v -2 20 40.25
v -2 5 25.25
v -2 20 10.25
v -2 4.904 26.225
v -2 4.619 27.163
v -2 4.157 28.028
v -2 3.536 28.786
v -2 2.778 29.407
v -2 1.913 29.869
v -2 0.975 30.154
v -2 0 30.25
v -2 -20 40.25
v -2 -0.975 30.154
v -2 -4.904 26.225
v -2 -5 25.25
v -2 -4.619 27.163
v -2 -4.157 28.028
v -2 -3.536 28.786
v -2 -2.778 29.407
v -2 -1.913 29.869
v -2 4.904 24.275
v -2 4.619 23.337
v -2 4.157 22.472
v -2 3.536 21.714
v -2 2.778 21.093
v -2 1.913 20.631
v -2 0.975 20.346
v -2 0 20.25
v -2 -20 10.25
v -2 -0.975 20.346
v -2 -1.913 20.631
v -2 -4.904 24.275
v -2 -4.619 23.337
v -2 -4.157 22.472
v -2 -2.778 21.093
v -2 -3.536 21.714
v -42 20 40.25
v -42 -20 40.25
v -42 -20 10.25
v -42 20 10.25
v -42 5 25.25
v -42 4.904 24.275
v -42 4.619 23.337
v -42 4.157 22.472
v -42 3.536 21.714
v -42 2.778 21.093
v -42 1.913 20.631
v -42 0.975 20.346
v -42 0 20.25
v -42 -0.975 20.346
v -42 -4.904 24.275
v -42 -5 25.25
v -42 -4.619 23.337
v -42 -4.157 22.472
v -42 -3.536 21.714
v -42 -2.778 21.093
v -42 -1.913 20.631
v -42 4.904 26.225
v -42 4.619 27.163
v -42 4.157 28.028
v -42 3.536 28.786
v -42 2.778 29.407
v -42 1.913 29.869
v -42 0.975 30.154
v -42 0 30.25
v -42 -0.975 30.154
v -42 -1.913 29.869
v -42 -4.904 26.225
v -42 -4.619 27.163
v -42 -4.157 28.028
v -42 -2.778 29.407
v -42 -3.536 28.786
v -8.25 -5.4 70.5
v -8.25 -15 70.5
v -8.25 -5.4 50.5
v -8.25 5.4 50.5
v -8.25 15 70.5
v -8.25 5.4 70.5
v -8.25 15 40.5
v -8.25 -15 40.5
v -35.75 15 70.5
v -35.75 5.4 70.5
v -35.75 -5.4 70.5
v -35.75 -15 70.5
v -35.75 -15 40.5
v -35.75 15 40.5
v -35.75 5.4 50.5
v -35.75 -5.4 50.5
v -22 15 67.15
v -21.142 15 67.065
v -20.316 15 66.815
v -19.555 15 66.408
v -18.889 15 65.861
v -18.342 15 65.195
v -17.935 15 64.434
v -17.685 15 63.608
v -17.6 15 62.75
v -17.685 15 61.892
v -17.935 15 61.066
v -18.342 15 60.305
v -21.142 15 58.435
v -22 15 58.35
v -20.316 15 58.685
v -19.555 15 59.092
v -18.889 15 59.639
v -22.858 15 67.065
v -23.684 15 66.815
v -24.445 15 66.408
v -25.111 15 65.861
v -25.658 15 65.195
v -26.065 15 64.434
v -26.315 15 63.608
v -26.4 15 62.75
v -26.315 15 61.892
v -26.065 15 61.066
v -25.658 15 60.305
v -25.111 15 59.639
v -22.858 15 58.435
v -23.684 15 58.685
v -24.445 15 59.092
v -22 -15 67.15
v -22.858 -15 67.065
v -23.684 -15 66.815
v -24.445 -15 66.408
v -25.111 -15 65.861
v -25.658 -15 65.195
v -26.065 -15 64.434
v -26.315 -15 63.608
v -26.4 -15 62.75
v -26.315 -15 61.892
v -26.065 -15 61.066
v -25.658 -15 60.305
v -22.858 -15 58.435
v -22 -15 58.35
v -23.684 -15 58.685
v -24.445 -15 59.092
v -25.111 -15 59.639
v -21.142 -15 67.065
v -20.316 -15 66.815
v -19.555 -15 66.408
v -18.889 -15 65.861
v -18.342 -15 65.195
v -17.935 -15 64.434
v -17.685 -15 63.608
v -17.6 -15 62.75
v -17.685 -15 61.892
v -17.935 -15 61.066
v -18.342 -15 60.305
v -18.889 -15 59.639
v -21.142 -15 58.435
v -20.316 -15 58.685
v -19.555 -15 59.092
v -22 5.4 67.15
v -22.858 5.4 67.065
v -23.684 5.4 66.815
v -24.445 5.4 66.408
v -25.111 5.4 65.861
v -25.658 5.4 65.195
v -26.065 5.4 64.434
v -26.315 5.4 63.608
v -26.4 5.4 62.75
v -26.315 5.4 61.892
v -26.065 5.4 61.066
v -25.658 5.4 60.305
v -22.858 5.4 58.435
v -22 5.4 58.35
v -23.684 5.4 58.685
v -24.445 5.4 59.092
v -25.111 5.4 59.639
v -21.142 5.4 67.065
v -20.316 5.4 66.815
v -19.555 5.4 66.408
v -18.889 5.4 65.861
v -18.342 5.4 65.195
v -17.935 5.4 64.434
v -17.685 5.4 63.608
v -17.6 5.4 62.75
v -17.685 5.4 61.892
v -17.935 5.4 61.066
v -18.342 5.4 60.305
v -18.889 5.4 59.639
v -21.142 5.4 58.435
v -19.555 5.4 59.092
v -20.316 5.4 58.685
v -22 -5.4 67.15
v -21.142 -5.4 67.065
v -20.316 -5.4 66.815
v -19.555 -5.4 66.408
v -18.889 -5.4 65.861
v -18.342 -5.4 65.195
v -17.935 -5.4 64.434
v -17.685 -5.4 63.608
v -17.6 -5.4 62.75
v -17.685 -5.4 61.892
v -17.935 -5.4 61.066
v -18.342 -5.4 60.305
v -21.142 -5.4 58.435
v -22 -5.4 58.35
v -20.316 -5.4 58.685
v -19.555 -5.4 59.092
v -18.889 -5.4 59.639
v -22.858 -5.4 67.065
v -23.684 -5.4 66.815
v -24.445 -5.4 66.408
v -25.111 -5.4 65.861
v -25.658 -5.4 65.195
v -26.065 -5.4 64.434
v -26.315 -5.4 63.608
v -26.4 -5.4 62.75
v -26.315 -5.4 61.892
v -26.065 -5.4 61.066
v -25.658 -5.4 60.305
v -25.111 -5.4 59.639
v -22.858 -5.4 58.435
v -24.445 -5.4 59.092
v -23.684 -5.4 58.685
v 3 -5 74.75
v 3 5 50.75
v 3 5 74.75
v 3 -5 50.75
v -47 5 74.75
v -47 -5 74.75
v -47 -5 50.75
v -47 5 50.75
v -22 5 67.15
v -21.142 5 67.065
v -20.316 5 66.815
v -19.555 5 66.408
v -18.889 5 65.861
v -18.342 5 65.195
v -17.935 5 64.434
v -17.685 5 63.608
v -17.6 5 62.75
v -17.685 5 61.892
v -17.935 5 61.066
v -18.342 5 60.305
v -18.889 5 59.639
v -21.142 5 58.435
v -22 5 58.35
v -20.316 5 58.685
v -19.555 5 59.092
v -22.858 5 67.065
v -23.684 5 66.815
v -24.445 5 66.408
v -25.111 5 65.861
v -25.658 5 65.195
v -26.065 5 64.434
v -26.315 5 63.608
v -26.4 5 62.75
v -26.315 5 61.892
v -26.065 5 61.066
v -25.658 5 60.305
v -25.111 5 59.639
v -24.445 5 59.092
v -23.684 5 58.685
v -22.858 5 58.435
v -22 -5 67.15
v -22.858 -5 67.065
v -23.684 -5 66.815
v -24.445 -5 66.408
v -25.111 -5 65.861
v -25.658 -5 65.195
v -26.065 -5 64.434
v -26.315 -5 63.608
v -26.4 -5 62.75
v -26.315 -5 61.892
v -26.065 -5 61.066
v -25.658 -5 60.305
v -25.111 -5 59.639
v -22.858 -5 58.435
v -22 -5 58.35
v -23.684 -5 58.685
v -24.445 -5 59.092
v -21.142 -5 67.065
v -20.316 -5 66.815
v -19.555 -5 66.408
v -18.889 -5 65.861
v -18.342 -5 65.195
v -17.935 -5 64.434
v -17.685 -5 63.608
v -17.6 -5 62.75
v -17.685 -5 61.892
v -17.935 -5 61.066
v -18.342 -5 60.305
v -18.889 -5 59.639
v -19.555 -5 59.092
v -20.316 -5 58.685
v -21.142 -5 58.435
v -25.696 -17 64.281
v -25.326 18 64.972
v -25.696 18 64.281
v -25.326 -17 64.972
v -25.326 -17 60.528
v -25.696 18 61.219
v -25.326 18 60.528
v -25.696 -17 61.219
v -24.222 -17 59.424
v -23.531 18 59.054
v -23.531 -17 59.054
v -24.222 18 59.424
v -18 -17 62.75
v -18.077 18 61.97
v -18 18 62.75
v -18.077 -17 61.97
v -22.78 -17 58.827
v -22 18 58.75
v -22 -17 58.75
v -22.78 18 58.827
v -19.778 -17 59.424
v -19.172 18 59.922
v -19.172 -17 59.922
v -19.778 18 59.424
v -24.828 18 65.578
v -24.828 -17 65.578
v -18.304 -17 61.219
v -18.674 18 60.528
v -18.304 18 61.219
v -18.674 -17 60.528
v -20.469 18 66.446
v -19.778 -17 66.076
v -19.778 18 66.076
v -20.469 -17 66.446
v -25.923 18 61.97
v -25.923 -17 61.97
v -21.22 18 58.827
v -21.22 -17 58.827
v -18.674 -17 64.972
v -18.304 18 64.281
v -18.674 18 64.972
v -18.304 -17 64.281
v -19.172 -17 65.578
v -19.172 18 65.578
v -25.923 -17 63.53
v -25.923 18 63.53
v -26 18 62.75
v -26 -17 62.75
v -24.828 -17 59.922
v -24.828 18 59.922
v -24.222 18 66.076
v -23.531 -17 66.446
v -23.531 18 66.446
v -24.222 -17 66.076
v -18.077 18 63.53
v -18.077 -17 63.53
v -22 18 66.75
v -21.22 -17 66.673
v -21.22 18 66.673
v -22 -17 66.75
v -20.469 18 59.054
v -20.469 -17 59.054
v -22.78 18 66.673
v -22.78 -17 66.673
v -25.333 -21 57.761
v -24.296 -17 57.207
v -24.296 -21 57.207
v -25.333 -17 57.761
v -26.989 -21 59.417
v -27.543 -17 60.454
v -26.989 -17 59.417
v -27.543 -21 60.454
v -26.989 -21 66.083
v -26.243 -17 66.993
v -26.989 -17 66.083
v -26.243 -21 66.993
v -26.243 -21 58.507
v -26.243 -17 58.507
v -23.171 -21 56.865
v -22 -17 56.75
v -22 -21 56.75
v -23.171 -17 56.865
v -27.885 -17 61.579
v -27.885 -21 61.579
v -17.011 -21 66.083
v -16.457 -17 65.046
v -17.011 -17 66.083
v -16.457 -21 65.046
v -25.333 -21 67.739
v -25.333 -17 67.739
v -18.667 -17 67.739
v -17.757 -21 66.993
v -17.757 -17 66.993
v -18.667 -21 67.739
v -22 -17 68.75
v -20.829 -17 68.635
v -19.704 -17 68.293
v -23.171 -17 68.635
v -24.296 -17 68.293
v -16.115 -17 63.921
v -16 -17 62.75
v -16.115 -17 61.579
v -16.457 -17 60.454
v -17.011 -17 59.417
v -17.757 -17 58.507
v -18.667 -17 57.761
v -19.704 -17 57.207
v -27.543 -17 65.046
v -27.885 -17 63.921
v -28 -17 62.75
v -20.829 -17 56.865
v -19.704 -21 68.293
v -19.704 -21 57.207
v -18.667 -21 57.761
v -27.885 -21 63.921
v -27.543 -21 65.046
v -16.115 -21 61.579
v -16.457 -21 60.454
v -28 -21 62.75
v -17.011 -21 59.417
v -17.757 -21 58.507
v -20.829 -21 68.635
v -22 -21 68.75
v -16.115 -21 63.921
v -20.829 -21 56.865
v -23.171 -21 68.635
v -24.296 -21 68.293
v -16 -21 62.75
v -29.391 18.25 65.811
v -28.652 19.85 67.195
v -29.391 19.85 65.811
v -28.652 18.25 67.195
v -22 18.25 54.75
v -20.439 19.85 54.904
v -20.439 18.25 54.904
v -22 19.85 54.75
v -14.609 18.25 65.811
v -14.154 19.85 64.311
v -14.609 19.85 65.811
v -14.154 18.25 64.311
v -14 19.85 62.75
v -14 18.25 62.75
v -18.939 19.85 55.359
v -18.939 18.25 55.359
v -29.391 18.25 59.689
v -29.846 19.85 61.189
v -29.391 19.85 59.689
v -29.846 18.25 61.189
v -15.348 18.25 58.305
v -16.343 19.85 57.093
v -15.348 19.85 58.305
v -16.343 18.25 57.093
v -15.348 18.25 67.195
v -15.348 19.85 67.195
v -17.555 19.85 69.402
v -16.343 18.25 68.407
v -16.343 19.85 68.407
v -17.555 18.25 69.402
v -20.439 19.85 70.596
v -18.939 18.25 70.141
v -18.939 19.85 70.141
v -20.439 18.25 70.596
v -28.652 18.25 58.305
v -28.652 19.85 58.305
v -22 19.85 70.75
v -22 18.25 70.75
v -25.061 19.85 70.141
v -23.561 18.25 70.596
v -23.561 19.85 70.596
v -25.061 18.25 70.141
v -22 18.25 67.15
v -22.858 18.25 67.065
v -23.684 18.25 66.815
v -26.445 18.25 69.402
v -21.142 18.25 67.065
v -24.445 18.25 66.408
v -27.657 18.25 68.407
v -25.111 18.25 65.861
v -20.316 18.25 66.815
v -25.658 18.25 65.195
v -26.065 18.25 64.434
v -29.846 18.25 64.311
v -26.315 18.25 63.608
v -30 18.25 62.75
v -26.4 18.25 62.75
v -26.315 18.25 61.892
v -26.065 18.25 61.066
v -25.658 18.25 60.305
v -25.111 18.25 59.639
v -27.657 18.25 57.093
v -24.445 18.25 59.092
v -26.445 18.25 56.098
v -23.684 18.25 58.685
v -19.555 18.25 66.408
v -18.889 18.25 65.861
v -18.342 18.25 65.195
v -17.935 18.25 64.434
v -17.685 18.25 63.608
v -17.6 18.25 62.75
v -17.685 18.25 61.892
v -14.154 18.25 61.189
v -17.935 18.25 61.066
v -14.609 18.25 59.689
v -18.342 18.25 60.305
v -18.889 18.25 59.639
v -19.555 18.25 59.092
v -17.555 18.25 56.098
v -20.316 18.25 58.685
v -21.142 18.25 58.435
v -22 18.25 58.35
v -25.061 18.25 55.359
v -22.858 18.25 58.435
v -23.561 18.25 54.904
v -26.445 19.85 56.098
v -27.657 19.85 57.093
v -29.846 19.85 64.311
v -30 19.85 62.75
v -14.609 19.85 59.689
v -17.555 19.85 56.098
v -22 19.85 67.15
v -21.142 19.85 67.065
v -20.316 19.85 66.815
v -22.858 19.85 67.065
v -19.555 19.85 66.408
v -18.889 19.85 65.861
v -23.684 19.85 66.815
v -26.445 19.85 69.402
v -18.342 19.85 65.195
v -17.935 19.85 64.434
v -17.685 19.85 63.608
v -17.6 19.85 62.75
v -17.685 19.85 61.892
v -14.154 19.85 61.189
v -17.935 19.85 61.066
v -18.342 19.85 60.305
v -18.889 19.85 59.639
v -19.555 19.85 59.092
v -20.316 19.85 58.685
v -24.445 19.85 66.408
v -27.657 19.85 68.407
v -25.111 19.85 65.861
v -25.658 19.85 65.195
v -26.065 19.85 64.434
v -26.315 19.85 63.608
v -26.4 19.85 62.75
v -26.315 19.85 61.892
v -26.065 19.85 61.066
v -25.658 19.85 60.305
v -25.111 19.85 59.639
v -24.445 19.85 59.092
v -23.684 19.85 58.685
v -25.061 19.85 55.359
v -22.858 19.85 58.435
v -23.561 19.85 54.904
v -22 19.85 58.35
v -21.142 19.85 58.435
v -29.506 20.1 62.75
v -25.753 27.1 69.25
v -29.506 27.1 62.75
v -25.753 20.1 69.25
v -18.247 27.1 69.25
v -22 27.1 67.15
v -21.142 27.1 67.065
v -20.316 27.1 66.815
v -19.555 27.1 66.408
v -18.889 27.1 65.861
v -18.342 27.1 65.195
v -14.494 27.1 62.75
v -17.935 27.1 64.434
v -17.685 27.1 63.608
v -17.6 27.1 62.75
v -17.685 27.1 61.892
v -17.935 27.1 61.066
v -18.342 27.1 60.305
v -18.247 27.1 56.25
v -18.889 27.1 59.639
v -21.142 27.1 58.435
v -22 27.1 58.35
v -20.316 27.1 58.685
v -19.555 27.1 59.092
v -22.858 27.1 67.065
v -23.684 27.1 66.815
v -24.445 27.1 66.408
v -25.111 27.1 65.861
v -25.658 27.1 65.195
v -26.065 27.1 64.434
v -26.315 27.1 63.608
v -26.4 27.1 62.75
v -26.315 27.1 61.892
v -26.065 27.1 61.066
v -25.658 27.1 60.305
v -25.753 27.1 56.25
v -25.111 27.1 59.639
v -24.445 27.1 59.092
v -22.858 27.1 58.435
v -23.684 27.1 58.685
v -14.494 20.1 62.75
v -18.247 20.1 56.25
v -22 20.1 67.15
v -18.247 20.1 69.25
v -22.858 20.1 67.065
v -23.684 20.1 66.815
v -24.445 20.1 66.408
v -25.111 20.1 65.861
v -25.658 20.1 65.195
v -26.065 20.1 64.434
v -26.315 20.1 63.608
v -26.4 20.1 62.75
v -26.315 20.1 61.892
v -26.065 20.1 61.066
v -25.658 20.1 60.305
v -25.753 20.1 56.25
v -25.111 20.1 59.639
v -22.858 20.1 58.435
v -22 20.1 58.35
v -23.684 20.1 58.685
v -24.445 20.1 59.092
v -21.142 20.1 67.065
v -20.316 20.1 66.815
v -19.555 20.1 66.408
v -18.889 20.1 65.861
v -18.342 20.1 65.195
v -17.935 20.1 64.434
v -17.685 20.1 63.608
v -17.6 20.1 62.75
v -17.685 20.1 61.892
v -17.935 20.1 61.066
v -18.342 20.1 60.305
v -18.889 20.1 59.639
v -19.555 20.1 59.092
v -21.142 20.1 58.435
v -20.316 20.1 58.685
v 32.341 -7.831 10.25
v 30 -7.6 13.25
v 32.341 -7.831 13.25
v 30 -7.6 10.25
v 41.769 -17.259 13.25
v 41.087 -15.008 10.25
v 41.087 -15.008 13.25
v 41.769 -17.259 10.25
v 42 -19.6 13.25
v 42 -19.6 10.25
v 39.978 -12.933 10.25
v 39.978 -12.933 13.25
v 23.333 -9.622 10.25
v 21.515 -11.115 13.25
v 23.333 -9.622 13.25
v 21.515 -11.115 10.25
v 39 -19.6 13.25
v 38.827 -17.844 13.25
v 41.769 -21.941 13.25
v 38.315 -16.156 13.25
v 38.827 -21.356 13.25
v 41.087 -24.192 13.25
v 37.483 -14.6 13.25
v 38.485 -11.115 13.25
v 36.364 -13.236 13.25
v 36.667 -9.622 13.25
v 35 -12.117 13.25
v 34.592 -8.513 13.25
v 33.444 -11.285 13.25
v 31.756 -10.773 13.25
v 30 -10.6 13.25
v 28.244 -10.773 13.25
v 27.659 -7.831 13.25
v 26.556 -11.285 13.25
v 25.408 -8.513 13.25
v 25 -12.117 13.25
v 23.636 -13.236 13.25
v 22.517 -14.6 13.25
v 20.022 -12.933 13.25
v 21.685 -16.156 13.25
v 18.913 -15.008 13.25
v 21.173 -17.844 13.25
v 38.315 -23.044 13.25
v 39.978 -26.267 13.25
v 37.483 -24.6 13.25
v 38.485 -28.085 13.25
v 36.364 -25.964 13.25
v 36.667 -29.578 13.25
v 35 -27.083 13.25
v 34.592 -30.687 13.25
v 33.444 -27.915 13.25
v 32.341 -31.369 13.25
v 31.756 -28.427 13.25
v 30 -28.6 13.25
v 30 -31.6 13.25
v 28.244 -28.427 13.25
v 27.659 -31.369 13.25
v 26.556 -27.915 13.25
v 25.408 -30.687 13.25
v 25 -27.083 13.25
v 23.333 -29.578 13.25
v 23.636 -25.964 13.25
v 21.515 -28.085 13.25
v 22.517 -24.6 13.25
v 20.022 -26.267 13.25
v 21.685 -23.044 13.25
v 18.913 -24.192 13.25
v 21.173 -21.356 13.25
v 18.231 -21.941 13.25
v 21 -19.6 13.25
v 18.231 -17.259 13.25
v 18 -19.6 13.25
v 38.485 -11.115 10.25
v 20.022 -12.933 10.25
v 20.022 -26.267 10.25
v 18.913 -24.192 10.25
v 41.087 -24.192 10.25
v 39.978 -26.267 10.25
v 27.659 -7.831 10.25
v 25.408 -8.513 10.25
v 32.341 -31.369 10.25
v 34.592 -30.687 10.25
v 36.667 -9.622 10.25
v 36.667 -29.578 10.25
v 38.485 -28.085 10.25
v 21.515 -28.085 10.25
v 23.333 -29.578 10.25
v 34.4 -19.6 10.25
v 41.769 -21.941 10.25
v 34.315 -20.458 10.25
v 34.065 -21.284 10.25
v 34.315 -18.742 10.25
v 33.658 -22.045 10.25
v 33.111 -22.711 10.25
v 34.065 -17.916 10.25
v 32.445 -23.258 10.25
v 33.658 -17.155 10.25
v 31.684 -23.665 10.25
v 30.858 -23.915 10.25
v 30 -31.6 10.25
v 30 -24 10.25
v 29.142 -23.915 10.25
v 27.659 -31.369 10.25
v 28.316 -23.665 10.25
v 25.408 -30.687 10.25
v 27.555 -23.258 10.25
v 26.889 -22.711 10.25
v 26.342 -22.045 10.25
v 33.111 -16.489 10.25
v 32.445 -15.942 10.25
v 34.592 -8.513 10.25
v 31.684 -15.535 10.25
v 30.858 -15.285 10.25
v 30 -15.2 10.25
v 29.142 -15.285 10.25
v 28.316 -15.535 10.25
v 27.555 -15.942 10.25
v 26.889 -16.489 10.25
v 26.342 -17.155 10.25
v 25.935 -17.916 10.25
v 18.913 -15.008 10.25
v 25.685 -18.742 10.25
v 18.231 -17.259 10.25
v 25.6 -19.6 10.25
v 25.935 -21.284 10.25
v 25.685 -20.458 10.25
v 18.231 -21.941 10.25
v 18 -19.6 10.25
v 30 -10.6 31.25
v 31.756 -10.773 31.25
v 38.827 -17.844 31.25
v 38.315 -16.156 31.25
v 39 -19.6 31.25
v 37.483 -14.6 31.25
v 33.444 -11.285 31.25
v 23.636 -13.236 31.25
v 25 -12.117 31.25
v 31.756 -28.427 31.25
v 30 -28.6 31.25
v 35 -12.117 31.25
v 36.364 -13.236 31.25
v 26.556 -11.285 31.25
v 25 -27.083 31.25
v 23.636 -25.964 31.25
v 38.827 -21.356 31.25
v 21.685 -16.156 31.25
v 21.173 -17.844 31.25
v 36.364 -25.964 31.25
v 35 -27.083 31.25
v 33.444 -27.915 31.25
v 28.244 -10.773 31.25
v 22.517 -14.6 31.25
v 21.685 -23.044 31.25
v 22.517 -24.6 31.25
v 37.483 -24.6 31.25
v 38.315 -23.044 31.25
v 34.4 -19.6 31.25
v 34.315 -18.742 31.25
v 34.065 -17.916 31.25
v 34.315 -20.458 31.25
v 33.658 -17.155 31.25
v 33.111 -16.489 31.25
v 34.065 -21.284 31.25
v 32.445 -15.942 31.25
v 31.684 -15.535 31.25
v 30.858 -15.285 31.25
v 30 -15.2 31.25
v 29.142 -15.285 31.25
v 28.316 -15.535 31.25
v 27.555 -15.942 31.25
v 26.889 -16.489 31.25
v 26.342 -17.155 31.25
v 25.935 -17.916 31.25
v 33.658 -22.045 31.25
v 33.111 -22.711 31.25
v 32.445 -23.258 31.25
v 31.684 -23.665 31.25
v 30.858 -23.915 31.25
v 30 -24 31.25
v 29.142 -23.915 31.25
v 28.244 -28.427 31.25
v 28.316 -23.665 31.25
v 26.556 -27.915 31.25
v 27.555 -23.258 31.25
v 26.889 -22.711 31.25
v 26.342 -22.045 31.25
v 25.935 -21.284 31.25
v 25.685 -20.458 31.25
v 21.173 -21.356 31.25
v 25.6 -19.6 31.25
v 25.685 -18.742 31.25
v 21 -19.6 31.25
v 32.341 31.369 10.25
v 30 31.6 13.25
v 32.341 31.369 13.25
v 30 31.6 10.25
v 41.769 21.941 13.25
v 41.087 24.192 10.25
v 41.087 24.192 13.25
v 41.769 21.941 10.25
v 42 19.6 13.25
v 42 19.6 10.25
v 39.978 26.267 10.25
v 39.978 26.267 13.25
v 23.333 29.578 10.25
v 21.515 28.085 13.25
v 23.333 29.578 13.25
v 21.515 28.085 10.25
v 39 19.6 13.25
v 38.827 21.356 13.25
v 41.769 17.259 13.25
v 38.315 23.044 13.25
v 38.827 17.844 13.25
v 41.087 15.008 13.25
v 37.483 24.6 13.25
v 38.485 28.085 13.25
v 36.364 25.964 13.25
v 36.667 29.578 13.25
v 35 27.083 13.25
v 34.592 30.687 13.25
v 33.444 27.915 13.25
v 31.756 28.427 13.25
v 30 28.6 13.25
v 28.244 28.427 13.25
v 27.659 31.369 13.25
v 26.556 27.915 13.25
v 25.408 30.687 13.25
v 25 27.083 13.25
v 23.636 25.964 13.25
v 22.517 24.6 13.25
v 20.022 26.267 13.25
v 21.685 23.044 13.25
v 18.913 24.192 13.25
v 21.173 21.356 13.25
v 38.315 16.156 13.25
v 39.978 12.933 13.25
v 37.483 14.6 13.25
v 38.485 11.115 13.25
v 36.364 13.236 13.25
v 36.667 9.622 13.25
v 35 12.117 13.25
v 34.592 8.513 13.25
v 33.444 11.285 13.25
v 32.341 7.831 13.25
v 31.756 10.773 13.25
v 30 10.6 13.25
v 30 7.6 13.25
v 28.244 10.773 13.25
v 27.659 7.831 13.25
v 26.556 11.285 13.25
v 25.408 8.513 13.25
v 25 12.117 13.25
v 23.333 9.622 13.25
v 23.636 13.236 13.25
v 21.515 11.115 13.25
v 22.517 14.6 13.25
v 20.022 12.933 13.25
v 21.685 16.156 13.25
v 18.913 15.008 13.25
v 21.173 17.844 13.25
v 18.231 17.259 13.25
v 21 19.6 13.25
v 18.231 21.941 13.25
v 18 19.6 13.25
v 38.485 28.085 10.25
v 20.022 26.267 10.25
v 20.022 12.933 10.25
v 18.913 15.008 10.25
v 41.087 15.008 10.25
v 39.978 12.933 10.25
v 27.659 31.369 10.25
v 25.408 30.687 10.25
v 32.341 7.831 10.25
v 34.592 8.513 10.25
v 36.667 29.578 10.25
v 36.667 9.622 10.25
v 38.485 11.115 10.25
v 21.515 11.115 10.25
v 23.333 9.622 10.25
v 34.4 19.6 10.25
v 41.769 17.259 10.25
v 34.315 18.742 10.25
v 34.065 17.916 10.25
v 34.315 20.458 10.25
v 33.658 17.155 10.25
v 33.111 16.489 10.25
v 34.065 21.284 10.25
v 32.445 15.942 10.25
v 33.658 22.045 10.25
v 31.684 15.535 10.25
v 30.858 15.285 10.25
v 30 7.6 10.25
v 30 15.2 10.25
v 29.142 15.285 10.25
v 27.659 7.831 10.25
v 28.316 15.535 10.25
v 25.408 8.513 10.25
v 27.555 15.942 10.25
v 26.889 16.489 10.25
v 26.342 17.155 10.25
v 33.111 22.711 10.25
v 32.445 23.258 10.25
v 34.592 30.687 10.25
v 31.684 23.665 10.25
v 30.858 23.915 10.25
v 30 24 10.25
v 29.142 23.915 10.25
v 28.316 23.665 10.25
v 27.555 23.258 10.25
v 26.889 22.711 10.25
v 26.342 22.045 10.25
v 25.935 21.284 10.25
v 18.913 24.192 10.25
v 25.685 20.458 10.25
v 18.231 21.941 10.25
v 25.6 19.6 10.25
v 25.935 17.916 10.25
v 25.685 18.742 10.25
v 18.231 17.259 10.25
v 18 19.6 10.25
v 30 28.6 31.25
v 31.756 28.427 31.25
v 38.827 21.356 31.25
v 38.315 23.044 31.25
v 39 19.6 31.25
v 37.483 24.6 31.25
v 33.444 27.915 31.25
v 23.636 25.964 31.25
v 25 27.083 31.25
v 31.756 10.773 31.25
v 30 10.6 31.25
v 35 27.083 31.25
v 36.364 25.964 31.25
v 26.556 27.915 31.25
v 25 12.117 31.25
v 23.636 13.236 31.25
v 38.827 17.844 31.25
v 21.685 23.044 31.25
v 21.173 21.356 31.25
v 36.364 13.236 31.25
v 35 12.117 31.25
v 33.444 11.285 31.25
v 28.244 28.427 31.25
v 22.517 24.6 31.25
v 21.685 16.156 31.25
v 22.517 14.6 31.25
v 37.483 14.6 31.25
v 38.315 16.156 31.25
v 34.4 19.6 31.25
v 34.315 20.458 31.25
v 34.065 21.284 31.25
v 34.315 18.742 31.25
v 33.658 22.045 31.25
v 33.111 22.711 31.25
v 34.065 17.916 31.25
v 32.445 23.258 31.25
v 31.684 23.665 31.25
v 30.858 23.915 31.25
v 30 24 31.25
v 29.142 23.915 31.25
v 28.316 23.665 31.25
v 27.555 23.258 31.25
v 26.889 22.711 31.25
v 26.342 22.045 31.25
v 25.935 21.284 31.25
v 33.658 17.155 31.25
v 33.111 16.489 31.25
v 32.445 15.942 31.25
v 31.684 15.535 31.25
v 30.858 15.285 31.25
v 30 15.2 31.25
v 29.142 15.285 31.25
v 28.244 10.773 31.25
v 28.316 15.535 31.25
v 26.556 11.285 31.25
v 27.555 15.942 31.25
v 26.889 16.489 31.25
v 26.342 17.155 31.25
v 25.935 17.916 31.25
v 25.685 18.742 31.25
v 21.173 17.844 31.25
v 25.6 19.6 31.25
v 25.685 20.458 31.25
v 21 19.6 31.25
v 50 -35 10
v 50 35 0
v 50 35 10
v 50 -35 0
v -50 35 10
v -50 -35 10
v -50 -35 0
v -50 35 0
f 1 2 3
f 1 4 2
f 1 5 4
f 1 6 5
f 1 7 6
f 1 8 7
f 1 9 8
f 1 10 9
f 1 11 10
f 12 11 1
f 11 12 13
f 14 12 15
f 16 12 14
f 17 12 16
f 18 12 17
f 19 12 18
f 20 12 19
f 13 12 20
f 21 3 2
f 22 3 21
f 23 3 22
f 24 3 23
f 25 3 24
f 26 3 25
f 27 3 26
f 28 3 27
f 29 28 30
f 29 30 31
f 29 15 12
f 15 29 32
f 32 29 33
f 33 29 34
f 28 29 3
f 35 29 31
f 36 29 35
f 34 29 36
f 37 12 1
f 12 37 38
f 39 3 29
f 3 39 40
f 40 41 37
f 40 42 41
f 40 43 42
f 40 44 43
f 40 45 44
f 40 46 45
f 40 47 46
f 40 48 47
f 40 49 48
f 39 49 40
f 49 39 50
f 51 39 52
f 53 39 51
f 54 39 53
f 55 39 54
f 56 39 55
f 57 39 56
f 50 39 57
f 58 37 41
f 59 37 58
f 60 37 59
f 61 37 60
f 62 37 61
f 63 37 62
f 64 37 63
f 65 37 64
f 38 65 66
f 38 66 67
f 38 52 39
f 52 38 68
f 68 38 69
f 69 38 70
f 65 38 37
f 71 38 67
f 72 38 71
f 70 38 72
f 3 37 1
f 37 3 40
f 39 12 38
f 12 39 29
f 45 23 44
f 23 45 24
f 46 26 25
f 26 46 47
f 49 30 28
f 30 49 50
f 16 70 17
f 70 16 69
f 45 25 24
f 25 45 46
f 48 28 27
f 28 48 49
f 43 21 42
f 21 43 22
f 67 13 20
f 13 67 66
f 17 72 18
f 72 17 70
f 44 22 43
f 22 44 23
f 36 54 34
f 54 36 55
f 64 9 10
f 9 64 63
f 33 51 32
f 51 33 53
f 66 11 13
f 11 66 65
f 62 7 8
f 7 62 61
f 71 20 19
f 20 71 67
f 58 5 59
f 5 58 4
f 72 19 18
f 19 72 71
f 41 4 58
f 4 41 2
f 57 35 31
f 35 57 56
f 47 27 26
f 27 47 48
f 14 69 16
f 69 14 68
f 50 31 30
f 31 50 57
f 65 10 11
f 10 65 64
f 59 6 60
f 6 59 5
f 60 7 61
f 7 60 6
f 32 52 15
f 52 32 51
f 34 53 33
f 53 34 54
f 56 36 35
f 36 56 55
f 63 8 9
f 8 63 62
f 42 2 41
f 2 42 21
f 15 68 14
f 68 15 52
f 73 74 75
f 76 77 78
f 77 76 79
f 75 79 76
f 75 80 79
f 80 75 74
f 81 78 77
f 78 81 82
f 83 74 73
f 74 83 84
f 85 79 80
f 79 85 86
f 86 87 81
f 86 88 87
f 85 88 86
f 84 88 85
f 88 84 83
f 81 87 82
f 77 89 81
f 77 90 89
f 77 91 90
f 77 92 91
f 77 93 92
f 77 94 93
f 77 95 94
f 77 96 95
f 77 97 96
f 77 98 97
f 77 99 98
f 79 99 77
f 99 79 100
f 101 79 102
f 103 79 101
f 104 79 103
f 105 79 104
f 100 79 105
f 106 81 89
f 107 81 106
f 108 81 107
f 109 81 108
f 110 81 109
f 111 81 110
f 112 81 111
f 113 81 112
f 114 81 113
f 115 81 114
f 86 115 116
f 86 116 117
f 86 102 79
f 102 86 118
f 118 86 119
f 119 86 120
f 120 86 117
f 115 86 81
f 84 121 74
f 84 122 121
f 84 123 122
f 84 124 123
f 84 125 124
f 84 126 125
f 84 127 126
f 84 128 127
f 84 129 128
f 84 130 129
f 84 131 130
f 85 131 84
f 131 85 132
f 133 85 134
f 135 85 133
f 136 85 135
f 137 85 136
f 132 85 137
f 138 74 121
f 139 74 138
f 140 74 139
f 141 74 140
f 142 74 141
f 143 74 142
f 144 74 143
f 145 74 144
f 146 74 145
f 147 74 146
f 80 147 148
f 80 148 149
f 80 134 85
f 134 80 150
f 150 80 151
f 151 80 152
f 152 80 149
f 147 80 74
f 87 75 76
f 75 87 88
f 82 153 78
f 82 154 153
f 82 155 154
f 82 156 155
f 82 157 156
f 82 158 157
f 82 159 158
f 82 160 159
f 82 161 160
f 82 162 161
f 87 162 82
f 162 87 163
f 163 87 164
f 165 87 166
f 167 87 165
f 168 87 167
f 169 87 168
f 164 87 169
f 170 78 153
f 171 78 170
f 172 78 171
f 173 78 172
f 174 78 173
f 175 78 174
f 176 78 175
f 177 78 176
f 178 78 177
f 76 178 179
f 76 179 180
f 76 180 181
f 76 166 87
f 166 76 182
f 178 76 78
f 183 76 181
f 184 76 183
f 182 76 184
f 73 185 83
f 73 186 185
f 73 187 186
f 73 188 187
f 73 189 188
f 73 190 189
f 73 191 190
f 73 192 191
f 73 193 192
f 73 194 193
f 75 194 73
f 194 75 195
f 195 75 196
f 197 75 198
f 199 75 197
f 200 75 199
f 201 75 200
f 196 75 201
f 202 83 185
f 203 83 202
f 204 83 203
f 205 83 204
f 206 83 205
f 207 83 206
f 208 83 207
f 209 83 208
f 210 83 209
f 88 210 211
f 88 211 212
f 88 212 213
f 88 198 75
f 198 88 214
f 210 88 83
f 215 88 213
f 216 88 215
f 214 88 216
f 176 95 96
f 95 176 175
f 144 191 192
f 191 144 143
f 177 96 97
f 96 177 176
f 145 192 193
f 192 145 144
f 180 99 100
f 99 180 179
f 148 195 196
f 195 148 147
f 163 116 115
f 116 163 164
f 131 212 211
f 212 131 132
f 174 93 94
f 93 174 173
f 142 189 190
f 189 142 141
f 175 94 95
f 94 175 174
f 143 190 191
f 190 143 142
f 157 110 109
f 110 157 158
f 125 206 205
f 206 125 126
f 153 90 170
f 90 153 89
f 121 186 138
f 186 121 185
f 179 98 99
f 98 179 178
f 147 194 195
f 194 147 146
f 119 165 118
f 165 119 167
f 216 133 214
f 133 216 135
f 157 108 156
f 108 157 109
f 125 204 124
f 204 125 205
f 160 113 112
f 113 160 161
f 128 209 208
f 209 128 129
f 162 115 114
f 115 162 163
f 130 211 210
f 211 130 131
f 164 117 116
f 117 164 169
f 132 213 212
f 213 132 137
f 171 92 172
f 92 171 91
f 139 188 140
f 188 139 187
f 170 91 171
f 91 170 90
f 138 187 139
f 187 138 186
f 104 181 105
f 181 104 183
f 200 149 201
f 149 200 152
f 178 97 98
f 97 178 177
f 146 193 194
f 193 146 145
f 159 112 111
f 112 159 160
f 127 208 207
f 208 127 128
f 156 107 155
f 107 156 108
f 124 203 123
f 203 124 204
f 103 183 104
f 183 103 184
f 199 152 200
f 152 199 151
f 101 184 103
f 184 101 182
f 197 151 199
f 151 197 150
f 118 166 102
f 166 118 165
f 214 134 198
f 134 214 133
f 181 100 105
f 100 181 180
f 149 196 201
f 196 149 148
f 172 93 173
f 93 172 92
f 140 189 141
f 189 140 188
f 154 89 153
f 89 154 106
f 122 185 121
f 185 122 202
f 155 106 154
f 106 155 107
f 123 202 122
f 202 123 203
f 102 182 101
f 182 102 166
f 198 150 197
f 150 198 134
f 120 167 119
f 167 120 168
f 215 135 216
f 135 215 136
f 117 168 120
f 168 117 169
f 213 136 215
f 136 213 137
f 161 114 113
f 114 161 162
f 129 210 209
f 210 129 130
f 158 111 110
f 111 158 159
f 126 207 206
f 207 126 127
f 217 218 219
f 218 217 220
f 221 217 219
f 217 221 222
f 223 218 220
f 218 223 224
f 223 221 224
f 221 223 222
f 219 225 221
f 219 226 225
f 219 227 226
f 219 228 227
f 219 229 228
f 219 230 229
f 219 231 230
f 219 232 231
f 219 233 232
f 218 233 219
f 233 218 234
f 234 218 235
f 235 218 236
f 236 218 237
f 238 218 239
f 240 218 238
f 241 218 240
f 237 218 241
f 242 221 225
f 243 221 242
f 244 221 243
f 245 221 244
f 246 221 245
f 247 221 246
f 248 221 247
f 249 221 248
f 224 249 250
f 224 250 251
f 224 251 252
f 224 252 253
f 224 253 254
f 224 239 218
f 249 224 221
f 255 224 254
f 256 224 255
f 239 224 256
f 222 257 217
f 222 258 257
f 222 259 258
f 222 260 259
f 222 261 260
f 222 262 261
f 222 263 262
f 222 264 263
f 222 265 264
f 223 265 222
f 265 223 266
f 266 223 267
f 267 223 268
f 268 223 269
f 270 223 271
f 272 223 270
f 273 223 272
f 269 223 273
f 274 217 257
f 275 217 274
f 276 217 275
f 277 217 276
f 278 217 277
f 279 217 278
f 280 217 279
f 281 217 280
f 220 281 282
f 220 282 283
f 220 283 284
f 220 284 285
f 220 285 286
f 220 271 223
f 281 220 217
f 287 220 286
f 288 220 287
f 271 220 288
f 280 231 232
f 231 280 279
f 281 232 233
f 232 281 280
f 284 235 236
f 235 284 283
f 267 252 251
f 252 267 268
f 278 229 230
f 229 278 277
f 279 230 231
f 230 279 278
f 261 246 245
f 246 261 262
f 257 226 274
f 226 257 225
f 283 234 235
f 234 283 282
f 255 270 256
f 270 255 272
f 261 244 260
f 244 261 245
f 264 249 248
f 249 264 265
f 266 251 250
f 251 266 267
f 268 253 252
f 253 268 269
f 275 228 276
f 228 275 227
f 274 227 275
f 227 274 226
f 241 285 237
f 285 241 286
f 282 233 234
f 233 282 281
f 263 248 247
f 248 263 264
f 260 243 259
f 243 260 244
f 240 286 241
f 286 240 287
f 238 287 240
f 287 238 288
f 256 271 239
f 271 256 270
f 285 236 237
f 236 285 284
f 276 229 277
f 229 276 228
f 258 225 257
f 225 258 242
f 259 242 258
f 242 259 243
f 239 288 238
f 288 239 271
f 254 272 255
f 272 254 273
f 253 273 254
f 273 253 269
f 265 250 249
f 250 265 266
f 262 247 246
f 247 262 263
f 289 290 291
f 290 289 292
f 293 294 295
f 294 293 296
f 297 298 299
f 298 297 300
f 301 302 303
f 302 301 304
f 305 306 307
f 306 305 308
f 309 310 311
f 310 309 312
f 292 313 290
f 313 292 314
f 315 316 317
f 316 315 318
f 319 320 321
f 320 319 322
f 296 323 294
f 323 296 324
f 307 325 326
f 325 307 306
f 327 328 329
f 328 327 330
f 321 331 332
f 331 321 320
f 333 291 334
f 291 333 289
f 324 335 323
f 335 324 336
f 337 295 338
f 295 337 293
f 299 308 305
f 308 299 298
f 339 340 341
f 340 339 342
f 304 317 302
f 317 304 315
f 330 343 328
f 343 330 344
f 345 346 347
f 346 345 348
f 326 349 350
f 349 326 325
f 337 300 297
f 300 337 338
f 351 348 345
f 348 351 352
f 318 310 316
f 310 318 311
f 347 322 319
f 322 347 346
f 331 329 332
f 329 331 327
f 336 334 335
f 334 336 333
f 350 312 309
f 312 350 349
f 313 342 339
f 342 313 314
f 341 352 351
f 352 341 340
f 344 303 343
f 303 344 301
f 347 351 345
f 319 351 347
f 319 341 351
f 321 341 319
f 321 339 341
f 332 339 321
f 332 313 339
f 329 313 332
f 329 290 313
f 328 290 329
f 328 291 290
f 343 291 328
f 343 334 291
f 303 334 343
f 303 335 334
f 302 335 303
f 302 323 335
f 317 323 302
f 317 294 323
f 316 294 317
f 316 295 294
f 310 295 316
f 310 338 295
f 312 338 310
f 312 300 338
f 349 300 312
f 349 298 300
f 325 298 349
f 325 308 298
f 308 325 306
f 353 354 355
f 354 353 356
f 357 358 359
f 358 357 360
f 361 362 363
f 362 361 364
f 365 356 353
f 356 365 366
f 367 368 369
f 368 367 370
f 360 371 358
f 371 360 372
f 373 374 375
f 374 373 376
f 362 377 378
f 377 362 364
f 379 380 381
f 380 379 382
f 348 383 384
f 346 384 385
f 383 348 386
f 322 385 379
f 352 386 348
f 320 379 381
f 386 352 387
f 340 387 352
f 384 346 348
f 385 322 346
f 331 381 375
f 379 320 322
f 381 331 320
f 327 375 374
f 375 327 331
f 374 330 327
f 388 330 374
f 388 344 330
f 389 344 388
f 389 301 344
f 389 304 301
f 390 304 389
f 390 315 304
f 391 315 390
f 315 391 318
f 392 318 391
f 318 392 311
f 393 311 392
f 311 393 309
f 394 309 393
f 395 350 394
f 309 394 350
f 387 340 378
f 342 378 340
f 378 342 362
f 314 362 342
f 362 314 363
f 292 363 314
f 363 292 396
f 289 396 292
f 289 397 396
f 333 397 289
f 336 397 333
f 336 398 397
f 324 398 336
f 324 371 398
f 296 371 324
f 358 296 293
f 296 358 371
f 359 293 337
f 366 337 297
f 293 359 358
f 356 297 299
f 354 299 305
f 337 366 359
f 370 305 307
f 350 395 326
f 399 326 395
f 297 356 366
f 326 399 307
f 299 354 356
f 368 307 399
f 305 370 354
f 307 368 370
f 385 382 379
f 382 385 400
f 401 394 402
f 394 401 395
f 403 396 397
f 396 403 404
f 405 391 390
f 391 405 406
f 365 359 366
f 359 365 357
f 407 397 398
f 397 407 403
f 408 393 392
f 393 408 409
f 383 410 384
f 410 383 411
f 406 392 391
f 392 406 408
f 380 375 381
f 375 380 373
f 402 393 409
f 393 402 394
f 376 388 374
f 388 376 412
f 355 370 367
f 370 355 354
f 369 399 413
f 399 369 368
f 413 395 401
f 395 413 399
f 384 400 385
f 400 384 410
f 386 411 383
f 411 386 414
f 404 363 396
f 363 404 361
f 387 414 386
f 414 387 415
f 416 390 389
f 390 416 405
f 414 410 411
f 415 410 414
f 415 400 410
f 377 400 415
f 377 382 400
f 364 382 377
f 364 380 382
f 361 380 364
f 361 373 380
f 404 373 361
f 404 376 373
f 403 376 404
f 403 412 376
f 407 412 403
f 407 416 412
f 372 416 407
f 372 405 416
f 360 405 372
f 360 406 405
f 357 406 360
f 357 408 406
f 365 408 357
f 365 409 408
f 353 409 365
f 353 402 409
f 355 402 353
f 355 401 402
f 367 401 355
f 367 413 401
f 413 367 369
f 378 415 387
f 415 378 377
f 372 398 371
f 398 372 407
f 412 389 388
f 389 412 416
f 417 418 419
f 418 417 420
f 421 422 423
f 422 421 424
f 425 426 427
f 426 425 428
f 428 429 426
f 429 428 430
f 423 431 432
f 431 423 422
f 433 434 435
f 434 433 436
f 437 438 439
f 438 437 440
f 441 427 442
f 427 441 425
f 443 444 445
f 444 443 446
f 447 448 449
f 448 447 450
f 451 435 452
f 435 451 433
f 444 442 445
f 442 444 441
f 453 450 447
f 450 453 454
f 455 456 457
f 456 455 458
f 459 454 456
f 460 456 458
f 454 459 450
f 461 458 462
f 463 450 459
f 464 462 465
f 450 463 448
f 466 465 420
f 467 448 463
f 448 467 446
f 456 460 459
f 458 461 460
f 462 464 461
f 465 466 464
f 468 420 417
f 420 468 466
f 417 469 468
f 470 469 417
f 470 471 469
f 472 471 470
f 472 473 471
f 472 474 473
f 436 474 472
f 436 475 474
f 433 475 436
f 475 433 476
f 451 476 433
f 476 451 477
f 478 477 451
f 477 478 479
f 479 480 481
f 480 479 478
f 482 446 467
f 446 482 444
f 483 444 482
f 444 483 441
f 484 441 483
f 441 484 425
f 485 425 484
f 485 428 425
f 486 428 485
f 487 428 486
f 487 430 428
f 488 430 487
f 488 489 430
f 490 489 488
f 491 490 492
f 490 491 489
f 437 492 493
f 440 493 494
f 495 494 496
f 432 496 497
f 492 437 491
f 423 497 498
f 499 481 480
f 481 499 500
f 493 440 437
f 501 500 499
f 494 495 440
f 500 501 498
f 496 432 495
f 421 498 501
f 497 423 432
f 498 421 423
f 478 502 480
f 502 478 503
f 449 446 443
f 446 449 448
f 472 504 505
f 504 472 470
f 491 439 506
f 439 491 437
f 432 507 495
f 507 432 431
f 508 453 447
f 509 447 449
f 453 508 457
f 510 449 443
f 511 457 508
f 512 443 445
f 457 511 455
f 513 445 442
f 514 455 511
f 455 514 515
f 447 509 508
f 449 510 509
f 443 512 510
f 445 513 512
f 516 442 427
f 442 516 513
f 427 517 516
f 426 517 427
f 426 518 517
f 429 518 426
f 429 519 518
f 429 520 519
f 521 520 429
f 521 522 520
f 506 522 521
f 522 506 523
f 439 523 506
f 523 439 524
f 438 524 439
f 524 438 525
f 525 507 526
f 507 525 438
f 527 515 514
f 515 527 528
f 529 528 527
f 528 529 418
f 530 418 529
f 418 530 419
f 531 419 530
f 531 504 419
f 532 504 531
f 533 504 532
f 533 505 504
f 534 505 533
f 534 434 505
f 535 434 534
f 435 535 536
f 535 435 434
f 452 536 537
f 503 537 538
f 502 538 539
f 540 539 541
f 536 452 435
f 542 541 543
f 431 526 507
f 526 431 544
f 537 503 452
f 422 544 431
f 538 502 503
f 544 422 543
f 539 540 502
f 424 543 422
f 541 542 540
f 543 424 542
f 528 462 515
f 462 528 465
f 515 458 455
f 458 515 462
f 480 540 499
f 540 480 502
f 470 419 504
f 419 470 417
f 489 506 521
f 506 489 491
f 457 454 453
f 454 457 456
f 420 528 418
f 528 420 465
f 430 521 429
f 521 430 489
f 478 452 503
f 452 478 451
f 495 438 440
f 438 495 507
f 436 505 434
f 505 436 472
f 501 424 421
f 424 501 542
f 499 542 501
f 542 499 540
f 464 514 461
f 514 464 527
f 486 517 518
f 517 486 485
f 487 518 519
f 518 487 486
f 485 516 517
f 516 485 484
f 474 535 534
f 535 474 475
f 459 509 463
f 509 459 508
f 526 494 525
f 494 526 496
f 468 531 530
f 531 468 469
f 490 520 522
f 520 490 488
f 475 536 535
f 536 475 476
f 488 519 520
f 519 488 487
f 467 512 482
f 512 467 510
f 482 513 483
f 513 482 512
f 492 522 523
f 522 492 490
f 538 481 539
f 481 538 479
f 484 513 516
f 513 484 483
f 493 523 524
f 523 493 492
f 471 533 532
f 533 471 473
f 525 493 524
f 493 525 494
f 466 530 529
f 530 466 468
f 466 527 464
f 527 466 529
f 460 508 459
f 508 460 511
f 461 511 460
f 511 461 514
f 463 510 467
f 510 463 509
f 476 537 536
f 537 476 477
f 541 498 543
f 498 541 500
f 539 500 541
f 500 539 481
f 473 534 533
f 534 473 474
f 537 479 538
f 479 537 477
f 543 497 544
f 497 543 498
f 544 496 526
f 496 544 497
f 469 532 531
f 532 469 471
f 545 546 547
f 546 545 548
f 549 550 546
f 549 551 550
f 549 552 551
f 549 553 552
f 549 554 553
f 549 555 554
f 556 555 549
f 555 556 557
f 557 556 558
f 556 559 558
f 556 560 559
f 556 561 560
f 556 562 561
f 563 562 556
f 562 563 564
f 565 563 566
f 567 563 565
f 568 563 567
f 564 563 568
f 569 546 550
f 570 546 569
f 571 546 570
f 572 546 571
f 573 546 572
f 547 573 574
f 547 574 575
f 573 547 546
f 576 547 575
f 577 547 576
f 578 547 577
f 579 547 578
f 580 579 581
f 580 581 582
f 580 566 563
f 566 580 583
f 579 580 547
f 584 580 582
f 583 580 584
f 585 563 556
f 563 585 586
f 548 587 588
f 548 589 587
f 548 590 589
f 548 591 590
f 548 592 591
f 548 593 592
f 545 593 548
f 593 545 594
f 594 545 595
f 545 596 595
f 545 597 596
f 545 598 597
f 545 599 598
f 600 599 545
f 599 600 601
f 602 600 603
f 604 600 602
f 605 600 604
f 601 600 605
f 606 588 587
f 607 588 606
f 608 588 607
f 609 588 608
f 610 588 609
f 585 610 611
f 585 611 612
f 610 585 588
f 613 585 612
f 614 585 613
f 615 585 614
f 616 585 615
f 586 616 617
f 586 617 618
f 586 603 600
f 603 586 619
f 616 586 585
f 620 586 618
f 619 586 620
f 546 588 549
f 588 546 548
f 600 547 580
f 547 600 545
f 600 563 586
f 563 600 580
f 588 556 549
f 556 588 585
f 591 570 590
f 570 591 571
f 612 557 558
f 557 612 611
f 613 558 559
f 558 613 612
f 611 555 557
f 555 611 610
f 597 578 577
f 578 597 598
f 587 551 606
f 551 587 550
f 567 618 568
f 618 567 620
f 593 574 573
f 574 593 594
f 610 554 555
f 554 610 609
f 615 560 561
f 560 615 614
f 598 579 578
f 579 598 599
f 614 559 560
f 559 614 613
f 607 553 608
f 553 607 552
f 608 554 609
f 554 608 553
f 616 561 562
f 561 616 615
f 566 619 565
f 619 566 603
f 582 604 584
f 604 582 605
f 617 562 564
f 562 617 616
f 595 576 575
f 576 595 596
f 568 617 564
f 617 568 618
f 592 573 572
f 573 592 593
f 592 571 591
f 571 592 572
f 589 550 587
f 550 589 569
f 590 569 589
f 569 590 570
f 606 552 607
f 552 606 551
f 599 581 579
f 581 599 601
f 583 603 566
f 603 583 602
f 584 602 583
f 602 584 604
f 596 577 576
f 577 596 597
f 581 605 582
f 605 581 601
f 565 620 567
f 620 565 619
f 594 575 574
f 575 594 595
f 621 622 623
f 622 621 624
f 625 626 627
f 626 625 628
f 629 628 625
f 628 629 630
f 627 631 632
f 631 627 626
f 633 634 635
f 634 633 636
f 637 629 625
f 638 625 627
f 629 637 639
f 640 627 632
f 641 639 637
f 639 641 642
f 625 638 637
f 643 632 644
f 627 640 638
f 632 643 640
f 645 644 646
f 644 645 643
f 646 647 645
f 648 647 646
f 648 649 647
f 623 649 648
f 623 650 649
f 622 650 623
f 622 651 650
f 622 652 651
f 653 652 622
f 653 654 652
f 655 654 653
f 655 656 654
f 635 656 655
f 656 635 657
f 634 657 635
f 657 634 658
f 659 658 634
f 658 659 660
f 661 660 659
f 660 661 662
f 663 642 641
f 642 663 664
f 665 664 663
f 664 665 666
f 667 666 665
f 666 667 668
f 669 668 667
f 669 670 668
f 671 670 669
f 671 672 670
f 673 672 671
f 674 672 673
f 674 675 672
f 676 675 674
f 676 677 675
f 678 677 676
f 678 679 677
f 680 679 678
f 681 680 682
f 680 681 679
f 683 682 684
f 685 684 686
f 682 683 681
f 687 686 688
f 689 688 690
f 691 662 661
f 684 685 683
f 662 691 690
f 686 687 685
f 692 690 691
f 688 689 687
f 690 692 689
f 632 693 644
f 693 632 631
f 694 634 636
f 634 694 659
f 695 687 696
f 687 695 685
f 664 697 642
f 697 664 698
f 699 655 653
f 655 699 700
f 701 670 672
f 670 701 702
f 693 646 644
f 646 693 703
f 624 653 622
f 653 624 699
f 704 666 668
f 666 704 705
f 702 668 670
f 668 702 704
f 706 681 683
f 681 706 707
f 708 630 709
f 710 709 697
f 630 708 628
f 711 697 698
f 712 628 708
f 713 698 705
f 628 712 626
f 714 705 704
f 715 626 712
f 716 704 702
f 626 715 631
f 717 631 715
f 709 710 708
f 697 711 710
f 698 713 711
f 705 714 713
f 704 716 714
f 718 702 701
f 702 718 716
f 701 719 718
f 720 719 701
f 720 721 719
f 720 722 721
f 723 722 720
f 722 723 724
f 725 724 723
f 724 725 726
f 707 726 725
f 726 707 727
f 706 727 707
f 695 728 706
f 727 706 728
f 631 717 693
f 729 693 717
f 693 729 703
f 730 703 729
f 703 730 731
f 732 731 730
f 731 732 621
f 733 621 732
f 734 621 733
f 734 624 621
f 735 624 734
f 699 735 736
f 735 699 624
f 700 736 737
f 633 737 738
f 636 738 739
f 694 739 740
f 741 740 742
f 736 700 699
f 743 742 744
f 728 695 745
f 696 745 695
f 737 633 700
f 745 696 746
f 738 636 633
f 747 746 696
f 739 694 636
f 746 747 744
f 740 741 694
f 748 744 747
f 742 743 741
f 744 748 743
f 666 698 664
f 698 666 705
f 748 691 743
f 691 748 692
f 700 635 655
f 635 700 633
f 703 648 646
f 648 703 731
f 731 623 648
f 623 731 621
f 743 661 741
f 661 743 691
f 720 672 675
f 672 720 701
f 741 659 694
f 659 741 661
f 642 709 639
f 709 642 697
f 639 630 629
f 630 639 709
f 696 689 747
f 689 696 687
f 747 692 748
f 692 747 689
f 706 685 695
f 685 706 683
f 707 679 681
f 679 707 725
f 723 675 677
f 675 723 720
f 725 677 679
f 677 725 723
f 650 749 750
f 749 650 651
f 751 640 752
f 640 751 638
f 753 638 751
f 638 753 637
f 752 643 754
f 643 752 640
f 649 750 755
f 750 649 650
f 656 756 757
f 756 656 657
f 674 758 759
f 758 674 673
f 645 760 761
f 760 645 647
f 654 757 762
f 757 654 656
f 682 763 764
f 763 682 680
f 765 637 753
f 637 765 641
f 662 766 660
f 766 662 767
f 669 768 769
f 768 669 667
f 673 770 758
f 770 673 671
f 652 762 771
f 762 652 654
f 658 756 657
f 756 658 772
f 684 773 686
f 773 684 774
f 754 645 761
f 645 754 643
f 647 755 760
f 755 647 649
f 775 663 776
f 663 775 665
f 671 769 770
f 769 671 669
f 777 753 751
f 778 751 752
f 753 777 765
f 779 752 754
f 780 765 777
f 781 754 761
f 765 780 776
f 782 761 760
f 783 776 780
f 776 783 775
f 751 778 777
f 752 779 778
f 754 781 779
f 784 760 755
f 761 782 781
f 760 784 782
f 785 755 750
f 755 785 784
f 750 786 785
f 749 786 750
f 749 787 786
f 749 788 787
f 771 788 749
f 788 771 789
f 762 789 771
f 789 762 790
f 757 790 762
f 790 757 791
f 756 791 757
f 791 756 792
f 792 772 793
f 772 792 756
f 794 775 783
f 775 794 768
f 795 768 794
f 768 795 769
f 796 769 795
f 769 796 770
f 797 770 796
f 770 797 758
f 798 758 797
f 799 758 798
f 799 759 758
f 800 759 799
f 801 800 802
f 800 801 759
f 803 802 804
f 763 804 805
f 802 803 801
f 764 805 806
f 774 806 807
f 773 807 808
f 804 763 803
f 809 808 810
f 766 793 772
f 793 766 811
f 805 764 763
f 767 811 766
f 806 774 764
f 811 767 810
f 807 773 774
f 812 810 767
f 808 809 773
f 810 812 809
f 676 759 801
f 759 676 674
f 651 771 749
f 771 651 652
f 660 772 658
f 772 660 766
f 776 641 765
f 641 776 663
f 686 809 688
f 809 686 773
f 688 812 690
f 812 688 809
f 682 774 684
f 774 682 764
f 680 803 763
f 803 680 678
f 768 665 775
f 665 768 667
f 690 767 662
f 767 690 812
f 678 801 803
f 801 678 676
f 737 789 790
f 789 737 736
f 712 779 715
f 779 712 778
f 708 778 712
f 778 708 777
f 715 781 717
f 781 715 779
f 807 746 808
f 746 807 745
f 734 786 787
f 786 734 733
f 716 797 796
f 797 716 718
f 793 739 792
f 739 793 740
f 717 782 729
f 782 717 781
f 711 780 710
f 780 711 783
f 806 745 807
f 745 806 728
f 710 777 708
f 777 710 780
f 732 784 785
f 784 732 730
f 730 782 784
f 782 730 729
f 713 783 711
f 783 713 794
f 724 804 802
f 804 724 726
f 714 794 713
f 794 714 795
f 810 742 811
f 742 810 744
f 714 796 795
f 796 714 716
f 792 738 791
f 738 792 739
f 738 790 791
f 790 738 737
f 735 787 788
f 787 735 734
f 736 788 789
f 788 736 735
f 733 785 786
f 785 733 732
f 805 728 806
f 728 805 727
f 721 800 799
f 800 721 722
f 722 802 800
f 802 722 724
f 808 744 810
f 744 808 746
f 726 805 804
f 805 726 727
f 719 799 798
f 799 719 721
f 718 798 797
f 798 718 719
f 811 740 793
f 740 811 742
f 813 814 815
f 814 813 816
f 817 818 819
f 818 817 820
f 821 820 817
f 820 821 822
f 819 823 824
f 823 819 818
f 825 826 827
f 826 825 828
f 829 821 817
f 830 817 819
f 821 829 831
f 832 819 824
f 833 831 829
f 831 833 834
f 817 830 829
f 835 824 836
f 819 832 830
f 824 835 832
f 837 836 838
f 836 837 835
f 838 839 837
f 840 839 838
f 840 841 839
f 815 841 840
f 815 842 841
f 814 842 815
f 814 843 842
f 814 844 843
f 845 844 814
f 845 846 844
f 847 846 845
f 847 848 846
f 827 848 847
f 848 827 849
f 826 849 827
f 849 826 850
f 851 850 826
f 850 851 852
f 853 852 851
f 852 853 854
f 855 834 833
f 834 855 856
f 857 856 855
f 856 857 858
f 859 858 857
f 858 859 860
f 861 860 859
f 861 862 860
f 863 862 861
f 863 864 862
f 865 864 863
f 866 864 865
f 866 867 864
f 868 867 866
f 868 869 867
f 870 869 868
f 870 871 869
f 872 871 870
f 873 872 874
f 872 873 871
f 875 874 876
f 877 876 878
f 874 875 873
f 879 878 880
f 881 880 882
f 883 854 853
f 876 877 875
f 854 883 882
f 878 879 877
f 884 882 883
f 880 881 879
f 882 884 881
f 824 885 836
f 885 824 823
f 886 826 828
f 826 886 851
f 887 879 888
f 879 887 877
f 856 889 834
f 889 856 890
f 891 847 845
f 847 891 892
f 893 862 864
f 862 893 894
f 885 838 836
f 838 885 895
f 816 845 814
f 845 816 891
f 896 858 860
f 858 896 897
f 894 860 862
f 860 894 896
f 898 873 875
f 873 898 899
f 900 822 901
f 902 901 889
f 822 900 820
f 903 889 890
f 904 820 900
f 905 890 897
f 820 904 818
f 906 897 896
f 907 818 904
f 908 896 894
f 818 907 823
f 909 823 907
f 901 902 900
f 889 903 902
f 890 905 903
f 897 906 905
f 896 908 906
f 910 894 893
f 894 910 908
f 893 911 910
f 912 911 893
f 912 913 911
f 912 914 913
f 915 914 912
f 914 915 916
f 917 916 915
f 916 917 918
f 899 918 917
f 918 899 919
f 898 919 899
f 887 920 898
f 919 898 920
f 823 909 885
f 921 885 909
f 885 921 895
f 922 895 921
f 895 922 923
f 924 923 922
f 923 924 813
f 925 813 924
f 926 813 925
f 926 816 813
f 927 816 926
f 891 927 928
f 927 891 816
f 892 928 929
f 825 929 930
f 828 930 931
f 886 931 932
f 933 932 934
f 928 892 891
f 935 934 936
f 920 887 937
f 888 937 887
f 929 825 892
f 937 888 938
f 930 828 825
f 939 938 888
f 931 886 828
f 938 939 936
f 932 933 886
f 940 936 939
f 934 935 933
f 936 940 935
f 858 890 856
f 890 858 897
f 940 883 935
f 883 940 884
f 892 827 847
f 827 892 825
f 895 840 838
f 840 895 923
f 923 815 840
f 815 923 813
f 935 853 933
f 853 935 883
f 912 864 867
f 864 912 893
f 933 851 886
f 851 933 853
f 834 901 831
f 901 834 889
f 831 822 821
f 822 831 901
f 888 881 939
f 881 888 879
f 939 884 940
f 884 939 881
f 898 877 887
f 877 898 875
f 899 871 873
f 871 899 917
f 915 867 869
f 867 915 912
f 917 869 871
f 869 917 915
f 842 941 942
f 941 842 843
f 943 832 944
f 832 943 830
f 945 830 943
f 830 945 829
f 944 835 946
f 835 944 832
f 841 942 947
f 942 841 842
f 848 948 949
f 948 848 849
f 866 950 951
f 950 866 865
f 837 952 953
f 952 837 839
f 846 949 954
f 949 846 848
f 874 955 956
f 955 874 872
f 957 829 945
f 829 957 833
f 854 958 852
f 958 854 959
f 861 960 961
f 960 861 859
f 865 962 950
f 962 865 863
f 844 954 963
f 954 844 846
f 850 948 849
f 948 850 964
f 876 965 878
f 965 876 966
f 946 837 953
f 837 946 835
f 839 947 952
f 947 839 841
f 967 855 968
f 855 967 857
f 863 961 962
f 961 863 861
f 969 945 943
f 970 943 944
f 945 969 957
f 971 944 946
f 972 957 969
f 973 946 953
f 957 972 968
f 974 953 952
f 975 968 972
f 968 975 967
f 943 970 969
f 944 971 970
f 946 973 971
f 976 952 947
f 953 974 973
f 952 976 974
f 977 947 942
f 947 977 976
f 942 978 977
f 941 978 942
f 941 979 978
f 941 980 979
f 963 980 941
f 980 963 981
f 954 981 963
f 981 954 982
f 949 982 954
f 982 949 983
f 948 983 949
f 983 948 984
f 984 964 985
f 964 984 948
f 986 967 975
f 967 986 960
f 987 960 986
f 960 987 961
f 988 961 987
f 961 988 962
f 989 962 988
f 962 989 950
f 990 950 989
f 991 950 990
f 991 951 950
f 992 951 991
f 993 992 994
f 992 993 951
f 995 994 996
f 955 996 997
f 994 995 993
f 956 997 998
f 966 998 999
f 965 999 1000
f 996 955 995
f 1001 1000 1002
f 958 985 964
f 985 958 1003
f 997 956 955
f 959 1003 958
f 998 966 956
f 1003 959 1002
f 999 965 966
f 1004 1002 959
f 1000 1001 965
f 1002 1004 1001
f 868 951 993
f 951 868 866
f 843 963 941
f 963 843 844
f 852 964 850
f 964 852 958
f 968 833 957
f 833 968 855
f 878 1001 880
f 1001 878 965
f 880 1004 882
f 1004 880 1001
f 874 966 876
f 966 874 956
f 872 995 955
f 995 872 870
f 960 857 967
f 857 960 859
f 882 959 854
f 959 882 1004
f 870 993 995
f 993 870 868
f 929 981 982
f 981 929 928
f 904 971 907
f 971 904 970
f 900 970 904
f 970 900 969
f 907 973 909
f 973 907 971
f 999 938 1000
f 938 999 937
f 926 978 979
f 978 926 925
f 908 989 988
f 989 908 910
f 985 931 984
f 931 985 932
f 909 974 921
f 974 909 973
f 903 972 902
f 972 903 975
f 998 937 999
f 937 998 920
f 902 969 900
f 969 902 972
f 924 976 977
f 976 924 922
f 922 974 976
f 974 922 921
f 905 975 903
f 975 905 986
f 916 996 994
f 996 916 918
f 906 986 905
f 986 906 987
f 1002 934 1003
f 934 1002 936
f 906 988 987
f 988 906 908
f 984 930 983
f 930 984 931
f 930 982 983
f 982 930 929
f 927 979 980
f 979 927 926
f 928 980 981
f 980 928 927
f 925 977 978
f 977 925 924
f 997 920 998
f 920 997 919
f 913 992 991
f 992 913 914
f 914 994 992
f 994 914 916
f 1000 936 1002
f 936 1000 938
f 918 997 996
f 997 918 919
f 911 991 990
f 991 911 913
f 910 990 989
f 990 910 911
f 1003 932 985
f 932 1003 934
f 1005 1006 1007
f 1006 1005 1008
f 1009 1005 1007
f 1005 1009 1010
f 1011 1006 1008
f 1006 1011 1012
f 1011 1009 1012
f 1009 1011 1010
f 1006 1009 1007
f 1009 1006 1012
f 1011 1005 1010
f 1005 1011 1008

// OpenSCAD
$fn = 32;

// ------------------------------------------------------------------------
// Indexing jig: plate 100 x 70 mm, pin d8
// Every part is its own module, assembly() places every instance.
// ------------------------------------------------------------------------

// --- part 1 ---
module jig_plate() {
  difference() {
    translate([-50, -35, 0]) cube([100, 70, 10]);
  }
}

// --- part 2 ---
module locator_block() {
  difference() {
    translate([-20, -20, 0]) cube([40, 40, 30]);
    translate([0, 0, 15]) rotate([0, 90, 0]) cylinder(h = 42, d = 10, center = true);
  }
}

// --- part 3 ---
module index_fork() {
  difference() {
    translate([-13.75, -15, 0]) cube([27.5, 30, 30]);
    translate([-14.75, -5.4, 10]) cube([29.5, 10.8, 21]);
    translate([0, 0, 22.25]) rotate([90, 0, 0]) cylinder(h = 32, d = 8.8, center = true);
  }
}

// --- part 4 ---
module index_arm() {
  difference() {
    translate([-25, -5, 0]) cube([50, 10, 24]);
    translate([0, 0, 12]) rotate([90, 0, 0]) cylinder(h = 12, d = 8.8, center = true);
  }
}

// --- part 5 ---
module index_pin() {
  rotate([0, 90, 0]) cylinder(h = 36, d = 8, center = true);
  translate([-21, 0, 0]) rotate([0, 90, 0]) cylinder(h = 4, d = 12);
}

// --- part 6 ---
module pin_washer() {
  difference() {
      translate([0, 0, 0]) cylinder(h = 1.6, d = 16);
      translate([0, 0, -1]) cylinder(h = 3.6, d = 8.8);
    }
}

// --- part 7 ---
module lock_nut() {
  difference() {
    linear_extrude(height = 7) polygon(points = [[7.506, 0], [3.753, 6.5], [-3.753, 6.5], [-7.506, 0], [-3.753, -6.5], [3.753, -6.5]]);
    translate([0, 0, -1]) cylinder(h = 9, d = 8.8);
  }
}

// --- part 8 ---
module guide_bush_a() {
  difference() {
    union() {
      cylinder(h = 3, d = 24);
      translate([0, 0, 3]) cylinder(h = 18, d = 18);
    }
    translate([0, 0, -1]) cylinder(h = 23, d = 8.8);
  }
}

// --- part 9 ---
module guide_bush_b() {
  difference() {
    union() {
      cylinder(h = 3, d = 24);
      translate([0, 0, 3]) cylinder(h = 18, d = 18);
    }
    translate([0, 0, -1]) cylinder(h = 23, d = 8.8);
  }
}

// --- assembly ---
module assembly() {
  color([0.80, 0.24, 0.20]) translate([0, 0, 0]) rotate([0, 0, 0]) jig_plate();
  color([0.20, 0.45, 0.75]) translate([-22, 0, 10.25]) rotate([0, 0, 0]) locator_block();
  color([0.25, 0.62, 0.32]) translate([-22, 0, 40.5]) rotate([0, 0, 0]) index_fork();
  color([0.92, 0.70, 0.18]) translate([-22, 0, 50.75]) rotate([0, 0, 0]) index_arm();
  color([0.58, 0.35, 0.70]) translate([-22, 0, 62.75]) rotate([0, 0, 90]) index_pin();
  color([0.16, 0.66, 0.66]) translate([-22, 19.85, 62.75]) rotate([90, 0, 0]) pin_washer();
  color([0.85, 0.48, 0.18]) translate([-22, 27.1, 62.75]) rotate([90, 0, 0]) lock_nut();
  color([0.55, 0.60, 0.65]) translate([30, -19.6, 10.25]) rotate([0, 0, 0]) guide_bush_a();
  color([0.75, 0.30, 0.55]) translate([30, 19.6, 10.25]) rotate([0, 0, 0]) guide_bush_b();
}

assembly();
